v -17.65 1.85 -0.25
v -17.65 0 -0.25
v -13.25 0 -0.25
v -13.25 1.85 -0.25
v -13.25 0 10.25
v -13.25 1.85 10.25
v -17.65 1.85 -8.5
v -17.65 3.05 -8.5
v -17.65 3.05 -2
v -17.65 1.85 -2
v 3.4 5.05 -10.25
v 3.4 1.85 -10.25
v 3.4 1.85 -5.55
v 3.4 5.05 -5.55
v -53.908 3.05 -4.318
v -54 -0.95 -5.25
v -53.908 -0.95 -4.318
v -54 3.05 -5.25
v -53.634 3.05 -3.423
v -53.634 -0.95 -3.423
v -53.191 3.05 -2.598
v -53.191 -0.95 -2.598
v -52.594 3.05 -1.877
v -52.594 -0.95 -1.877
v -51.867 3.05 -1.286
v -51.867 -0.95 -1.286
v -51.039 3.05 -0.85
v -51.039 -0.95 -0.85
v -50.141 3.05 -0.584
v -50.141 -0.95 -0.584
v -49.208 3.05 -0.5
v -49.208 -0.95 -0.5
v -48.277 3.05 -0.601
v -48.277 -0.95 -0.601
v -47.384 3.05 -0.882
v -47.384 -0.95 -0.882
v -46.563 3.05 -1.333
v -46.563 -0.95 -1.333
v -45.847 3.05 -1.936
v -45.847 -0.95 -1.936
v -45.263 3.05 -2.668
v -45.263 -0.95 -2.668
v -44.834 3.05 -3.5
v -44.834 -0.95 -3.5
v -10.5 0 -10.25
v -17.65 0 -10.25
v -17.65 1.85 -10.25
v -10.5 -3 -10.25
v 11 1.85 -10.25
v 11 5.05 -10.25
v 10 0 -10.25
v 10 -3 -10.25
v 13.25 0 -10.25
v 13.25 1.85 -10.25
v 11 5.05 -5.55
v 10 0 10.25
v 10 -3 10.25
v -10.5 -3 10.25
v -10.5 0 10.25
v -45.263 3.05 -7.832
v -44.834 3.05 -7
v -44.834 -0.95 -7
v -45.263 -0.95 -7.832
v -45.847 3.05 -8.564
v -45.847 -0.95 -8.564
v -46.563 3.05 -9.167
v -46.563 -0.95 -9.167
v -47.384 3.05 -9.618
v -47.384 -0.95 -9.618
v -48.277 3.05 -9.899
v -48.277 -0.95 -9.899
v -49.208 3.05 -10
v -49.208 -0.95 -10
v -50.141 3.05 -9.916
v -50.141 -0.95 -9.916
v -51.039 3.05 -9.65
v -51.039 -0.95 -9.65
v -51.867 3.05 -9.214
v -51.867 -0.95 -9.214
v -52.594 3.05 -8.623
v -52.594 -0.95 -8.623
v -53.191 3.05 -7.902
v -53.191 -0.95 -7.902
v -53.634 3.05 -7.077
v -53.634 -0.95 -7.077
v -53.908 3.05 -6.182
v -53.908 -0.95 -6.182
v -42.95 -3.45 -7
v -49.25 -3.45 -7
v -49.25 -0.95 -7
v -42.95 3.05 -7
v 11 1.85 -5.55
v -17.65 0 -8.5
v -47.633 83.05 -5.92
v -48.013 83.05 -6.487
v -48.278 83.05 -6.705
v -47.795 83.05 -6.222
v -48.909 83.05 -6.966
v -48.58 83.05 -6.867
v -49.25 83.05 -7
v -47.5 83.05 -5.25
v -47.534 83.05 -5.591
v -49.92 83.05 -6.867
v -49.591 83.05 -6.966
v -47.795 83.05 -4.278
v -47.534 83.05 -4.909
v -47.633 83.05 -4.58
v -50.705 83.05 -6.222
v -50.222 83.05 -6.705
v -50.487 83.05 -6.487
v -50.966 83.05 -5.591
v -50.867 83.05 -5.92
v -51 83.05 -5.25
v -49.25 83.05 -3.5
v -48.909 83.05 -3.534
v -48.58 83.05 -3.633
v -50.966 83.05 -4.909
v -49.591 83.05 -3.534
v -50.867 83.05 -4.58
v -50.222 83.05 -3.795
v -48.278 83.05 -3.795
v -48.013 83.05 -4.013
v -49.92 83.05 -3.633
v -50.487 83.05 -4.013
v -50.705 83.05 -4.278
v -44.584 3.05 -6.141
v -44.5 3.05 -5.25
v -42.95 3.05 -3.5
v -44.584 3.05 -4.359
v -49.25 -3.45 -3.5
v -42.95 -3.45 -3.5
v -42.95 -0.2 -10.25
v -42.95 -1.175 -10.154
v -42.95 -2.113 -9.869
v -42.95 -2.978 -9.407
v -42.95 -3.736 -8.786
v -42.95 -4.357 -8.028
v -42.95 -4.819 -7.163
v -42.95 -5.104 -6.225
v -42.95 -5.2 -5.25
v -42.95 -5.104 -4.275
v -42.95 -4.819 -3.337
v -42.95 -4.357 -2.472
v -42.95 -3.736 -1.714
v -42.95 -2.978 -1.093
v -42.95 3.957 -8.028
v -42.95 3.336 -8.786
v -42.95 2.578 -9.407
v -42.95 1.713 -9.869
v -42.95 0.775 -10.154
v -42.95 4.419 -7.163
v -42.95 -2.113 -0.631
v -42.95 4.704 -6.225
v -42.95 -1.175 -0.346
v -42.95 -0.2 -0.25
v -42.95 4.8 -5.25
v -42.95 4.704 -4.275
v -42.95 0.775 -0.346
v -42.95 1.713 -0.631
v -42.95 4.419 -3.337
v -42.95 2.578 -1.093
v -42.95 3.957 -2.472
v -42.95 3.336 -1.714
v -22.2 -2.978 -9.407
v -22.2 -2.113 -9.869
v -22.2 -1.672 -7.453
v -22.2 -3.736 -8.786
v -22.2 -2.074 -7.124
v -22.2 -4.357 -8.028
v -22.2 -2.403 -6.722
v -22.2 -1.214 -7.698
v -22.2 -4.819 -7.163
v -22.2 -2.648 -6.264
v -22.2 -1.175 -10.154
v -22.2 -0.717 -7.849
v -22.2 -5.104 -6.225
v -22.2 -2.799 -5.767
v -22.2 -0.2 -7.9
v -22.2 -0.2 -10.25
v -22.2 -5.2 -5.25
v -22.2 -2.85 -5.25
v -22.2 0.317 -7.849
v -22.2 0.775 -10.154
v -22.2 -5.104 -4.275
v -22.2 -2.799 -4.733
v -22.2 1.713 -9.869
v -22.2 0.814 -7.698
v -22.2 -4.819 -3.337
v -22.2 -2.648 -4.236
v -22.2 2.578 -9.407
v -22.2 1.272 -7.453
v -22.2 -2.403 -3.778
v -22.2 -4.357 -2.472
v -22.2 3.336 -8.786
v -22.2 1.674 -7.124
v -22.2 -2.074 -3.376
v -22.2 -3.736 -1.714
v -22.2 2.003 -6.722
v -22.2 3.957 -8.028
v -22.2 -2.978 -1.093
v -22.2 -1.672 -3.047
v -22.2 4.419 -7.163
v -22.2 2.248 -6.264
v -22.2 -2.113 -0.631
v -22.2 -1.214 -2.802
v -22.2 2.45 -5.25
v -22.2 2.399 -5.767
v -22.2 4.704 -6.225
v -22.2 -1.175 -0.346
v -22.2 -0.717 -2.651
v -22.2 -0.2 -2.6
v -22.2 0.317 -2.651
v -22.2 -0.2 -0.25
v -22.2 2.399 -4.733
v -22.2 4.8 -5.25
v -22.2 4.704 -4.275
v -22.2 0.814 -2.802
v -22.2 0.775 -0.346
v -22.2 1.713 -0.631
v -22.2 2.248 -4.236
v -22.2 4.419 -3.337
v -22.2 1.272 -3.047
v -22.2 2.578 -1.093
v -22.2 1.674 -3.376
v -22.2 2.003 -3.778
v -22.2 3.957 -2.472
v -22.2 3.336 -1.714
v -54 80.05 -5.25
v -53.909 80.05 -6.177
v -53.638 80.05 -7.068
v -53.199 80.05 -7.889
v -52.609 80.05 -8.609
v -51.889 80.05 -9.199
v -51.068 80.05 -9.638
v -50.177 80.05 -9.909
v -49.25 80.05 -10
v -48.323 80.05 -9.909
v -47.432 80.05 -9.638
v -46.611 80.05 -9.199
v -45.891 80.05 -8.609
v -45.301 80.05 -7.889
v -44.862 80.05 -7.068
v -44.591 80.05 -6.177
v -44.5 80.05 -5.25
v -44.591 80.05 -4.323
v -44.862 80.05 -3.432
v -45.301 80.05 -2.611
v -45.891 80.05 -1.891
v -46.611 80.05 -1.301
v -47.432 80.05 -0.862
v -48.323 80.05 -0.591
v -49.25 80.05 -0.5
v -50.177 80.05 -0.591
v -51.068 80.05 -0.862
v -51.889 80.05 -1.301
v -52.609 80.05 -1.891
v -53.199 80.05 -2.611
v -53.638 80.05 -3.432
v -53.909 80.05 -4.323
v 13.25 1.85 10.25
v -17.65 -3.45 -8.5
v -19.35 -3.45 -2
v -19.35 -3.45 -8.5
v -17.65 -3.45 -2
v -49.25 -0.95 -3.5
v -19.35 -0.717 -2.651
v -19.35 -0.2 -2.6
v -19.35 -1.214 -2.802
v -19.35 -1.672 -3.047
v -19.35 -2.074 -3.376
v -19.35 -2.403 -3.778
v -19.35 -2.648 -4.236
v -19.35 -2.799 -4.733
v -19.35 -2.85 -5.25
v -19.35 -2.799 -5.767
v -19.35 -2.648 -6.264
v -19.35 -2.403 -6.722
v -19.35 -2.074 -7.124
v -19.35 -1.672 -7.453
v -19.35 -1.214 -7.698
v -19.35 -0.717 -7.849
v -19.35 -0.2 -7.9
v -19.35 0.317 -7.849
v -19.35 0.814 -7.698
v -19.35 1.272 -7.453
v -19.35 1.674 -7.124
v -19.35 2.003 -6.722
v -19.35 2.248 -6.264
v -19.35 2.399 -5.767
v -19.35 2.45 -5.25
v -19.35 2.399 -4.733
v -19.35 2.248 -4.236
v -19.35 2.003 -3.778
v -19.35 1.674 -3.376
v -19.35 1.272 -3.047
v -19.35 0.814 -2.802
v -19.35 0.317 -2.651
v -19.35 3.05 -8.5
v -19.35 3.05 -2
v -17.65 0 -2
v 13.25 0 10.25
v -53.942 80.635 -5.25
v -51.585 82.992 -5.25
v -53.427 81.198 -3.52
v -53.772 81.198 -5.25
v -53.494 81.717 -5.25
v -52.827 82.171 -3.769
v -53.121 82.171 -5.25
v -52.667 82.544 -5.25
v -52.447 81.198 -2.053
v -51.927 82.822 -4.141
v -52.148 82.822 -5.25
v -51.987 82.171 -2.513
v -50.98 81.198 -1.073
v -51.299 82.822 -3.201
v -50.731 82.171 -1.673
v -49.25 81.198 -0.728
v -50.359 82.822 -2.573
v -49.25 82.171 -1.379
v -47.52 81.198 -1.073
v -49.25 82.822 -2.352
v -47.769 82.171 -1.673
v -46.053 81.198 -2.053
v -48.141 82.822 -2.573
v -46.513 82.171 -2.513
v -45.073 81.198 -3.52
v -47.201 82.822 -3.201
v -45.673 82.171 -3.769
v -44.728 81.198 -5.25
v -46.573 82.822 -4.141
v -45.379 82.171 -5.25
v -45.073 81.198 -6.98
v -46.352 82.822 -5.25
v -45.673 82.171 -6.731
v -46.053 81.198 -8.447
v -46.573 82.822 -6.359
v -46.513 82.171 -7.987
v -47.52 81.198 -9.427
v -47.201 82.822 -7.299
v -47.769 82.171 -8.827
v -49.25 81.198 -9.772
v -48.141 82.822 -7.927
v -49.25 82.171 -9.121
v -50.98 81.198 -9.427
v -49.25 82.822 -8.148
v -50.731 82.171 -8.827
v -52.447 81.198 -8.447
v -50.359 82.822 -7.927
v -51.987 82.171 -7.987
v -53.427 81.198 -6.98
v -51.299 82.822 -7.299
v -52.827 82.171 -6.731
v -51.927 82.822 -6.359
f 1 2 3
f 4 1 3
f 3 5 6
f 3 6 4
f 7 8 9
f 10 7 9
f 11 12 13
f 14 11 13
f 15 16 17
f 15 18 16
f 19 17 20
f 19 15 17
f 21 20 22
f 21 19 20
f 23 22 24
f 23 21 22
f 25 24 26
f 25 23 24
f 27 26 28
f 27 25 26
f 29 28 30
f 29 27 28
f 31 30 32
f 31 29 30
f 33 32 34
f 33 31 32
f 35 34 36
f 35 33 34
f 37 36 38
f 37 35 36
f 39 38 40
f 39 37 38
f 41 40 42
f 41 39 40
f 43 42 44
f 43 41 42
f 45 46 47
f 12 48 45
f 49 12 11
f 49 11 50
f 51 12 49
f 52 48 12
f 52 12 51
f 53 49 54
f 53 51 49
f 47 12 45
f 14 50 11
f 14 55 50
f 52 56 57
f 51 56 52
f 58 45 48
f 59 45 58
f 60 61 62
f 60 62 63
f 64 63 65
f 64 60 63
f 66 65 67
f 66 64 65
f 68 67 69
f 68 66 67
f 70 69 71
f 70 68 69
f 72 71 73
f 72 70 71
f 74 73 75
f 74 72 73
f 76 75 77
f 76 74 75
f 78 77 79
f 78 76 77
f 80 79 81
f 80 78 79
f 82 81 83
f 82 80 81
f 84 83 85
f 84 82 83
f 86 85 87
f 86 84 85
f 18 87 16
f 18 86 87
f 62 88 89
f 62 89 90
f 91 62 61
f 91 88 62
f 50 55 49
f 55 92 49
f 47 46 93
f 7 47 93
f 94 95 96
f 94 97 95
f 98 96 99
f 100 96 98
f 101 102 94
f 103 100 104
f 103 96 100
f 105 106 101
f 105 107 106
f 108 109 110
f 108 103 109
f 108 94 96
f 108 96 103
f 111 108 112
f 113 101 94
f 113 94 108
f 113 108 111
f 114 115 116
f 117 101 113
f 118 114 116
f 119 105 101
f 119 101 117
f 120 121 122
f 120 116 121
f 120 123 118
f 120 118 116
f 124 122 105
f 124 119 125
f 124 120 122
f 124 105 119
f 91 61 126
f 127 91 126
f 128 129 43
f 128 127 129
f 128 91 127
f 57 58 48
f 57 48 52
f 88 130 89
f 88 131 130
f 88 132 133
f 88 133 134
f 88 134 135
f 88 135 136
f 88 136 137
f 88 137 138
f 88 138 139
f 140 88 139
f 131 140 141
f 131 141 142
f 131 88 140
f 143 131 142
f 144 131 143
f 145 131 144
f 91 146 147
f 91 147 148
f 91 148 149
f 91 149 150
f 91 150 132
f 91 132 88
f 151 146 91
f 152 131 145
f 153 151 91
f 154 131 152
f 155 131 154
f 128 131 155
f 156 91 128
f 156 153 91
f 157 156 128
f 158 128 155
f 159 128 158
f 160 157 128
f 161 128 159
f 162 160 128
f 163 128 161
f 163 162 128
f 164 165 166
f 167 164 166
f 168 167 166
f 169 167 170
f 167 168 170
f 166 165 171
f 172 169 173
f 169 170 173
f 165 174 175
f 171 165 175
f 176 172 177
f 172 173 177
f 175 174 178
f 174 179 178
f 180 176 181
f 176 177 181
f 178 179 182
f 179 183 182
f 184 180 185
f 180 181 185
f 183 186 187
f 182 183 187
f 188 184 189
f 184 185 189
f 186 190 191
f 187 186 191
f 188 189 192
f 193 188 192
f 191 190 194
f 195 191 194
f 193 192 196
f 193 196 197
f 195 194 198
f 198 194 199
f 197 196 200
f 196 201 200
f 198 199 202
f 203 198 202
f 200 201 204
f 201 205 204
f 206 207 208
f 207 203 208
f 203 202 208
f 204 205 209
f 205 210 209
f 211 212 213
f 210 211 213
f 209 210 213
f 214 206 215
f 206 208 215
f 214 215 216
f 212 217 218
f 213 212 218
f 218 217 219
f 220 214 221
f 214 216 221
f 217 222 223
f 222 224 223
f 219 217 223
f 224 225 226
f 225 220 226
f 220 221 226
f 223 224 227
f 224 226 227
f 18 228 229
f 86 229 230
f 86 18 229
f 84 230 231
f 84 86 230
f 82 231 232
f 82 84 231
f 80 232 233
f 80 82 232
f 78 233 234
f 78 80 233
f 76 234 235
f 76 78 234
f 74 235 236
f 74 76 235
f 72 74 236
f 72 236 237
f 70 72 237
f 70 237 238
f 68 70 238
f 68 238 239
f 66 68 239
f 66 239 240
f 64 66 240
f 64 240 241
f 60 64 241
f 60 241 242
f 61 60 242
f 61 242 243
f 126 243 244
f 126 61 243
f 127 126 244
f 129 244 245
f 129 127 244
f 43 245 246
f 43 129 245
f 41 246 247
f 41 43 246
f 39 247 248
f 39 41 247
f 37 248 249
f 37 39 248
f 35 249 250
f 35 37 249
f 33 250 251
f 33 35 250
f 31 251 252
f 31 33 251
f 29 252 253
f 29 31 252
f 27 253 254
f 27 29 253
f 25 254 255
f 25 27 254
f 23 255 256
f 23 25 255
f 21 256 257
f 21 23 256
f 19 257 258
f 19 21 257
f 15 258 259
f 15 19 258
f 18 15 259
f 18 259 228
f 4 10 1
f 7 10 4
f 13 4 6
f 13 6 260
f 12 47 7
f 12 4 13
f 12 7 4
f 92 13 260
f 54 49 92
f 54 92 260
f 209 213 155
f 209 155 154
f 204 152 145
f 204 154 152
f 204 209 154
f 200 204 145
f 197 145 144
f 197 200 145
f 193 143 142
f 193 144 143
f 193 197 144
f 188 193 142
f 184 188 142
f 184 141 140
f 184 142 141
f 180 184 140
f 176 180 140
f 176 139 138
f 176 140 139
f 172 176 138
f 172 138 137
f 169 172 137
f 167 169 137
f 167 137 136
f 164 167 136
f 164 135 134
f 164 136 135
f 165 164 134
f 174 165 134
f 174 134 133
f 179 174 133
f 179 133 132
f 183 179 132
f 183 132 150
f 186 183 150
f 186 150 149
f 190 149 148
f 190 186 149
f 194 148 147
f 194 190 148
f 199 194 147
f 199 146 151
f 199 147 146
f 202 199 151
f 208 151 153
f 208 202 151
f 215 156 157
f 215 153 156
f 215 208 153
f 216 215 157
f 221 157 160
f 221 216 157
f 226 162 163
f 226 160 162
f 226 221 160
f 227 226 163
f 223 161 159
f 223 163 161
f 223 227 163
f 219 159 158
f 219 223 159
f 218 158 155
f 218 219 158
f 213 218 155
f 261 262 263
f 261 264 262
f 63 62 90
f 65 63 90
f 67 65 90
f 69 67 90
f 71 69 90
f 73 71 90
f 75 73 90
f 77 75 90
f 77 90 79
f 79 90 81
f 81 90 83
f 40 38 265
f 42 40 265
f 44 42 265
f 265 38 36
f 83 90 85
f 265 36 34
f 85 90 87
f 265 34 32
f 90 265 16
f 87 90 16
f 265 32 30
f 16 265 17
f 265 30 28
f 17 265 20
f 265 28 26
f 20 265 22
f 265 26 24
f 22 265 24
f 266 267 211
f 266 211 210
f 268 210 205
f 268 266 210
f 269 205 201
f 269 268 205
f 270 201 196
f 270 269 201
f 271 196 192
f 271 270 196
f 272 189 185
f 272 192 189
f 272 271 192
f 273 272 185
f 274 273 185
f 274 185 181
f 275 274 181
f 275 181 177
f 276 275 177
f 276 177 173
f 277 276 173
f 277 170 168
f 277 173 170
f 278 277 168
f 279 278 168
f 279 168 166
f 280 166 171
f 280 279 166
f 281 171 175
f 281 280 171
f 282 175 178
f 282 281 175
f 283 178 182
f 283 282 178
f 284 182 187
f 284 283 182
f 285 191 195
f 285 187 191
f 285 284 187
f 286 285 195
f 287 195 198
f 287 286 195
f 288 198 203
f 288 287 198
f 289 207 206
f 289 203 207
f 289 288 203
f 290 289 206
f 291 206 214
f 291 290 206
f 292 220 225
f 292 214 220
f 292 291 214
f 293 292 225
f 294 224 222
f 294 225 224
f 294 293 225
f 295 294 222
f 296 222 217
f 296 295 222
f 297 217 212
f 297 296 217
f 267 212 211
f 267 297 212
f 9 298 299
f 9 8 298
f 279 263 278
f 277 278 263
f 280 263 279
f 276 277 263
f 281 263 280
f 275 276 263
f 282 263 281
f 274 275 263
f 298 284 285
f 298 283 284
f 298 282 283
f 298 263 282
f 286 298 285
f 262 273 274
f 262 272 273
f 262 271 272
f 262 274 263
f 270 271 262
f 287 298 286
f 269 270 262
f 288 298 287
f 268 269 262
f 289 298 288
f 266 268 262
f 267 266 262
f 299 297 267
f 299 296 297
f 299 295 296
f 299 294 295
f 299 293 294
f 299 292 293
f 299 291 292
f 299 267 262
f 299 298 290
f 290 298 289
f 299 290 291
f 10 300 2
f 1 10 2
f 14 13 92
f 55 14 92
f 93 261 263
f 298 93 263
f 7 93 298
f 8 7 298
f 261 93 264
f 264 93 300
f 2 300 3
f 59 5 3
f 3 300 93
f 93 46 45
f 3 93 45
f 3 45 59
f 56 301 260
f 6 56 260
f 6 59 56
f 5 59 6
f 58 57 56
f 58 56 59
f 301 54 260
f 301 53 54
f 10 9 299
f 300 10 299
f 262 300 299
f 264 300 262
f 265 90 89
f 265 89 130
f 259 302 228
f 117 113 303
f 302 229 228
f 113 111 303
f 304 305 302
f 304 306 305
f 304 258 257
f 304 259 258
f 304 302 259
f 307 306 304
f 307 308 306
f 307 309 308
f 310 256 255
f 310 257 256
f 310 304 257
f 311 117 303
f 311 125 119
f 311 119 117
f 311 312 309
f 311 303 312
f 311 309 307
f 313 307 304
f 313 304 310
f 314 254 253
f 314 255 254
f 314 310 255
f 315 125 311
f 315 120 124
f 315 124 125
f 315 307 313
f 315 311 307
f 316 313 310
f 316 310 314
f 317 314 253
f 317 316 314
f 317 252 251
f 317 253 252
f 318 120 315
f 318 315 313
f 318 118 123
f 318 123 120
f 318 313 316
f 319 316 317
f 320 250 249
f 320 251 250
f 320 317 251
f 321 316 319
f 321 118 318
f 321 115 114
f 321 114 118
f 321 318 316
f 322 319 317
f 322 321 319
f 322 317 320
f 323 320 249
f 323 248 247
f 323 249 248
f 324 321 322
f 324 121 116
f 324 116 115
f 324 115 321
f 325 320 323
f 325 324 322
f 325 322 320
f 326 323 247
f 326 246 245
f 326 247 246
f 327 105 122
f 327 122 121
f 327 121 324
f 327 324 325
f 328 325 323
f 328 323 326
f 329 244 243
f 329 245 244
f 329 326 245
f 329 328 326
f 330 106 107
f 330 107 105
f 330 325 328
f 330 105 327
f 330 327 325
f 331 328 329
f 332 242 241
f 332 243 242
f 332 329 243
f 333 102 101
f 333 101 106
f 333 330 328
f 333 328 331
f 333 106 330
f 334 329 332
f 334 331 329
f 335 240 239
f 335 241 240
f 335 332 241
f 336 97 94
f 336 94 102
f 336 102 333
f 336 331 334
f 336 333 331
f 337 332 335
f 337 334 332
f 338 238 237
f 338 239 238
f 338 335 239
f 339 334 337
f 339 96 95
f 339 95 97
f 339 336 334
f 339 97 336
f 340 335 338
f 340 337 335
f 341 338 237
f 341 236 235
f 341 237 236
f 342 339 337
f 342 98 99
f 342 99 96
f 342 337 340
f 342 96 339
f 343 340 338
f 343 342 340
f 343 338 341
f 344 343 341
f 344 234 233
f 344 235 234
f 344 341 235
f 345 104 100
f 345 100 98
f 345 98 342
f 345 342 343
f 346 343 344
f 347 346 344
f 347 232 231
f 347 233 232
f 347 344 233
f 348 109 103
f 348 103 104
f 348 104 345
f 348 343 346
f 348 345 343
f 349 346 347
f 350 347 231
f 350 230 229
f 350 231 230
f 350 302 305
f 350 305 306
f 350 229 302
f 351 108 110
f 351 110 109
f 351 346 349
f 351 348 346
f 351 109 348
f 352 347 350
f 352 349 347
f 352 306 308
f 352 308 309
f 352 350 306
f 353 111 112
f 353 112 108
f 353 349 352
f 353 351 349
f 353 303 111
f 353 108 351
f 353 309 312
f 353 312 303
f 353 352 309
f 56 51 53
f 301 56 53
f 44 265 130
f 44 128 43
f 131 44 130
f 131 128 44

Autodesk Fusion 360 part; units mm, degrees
sketch "Sketch1" plane through (0, 0, 0) normal (0, 1, 0) x (1, 0, 0)
  line L0 (13.25, -10.25) -> (-13.25, -10.25)
  line L1 (-13.25, -10.25) -> (-13.25, 10.25)
  line L2 (-13.25, 10.25) -> (13.25, 10.25)
  line L3 (13.25, 10.25) -> (13.25, -10.25)
  line L4 (13.25, -10.25) -> (-13.25, 10.25) construction
  line L5 (-13.25, -10.25) -> (13.25, 10.25) construction
  line L6 (-13.25, 10.25) -> (-17.65, 10.25)
  line L7 (-17.65, 10.25) -> (-17.65, 0.25)
  line L8 (-17.65, 0.25) -> (-13.25, 0.25)
  dimension "d1" = 26.5
  dimension "d2" = 20.5
  dimension "d3" = 10
  dimension "d4" = 4.4
extrude "Extrude1" add sketch "Sketch1" along normal blind 1.85
sketch "Sketch2" plane through (0, 1.85, 0) normal (0, 1, 0) x (-1, 0, 0)
  line L0 (-13.25, -10.25) -> (17.65, -10.25)
  line L1 (17.65, -10.25) -> (17.65, -0.25)
  line L2 (17.65, -0.25) -> (13.25, -0.25)
  line L3 (13.25, -0.25) -> (13.25, 10.25)
  line L4 (13.25, 10.25) -> (-13.25, 10.25)
  line L5 (-13.25, 10.25) -> (-13.25, -10.25)
  line L6 (-11, -10.25) -> (-3.4, -10.25)
  line L7 (-3.4, -10.25) -> (-3.4, -5.55)
  line L8 (-3.4, -5.55) -> (-11, -5.55)
  line L9 (-11, -5.55) -> (-11, -10.25)
  dimension "d7" = 7.6
  dimension "d8" = 4.7
  dimension "d9" = 2.25
extrude "Extrude2" add sketch "Sketch2" along normal blind 3.2 contours L0 L6 L7 L8 L9
sketch "Sketch3" plane through (0, 0, 0) normal (0, -1, 0) x (1, 0, 0)
  line L0 (-17.65, -10.25) -> (13.25, -10.25)
  line L1 (13.25, -10.25) -> (13.25, 10.25)
  line L2 (13.25, 10.25) -> (-13.25, 10.25)
  line L3 (-13.25, 10.25) -> (-13.25, -0.25)
  line L4 (-13.25, -0.25) -> (-17.65, -0.25)
  line L5 (-17.65, -0.25) -> (-17.65, -10.25)
  line L6 (-10.5, 10.25) -> (10, 10.25)
  line L7 (10, 10.25) -> (10, -10.25)
  line L8 (10, -10.25) -> (-10.5, -10.25)
  line L9 (-10.5, -10.25) -> (-10.5, 10.25)
  dimension "d12" = 20.5
  dimension "d13" = 3.25
extrude "Extrude3" add sketch "Sketch3" along normal blind 3 contours L0 L2 L6 L7 L8 L9
sketch "Sketch4" plane through (-17.65, 0, 0) normal (-1, 0, 0) x (0, 0, 1)
  line L0 (-10.25, 0) -> (-0.25, 0)
  line L1 (-0.25, 0) -> (-0.25, 1.85)
  line L2 (-0.25, 1.85) -> (-10.25, 1.85)
  line L3 (-10.25, 1.85) -> (-10.25, 0)
  line L4 (-8.5, 3.05) -> (-2, 3.05)
  line L5 (-2, 3.05) -> (-2, -3.45)
  line L6 (-2, -3.45) -> (-8.5, -3.45)
  line L7 (-8.5, -3.45) -> (-8.5, 3.05)
  dimension "d16" = 6.5
  dimension "d17" = 6.5
  dimension "d18" = 1.2
  dimension "d19" = 1.75
extrude "Extrude4" add sketch "Sketch4" along normal blind 1.7 contours L0 L2 L5 L7 | L0 L5 L6 L7 | L2 L4 L5 L7
sketch "Sketch5" plane through (-19.35, 0, 0) normal (-1, 0, 0) x (0, 0, 1)
  line L0 (-8.5, -3.45) -> (-2, -3.45)
  line L1 (-2, -3.45) -> (-2, 3.05)
  line L2 (-2, 3.05) -> (-8.5, 3.05)
  line L3 (-8.5, 3.05) -> (-8.5, -3.45)
  circle A0 centre (-5.25, -0.2) radius 2.65
  line L4 (-5.25, -0.2) -> (-5.25, 3.05) construction
  line L5 (-5.25, -0.2) -> (-5.25, -3.45) construction
  dimension "d22" = 5.3
extrude "Extrude5" add sketch "Sketch5" along normal blind 2.85 contours A0
sketch "Sketch6" plane through (-22.2, 0, 0) normal (-1, 0, 0) x (0, 0, 1)
  circle A0 centre (-5.25, -0.2) radius 2.65
  circle A1 centre (-5.25, -0.2) radius 5
  dimension "d25" = 10
extrude "Extrude6" add sketch "Sketch6" along normal blind 20.75 contours A0 | A1
sketch "Sketch7" plane through (-42.95, 0, 0) normal (-1, 0, 0) x (0, 0, 1)
  circle A0 centre (-5.25, -0.2) radius 5
  line L0 (-3.5, -3.45) -> (-7, -3.45)
  line L1 (-7, -3.45) -> (-7, 3.05)
  line L2 (-7, 3.05) -> (-3.5, 3.05)
  line L3 (-3.5, 3.05) -> (-3.5, -3.45)
  line L4 (-3.5, -3.45) -> (-7, 3.05) construction
  line L5 (-7, -3.45) -> (-3.5, 3.05) construction
  point P0 (-5.25, -0.2)
  dimension "d28" = 6.5
  dimension "d29" = 3.5
extrude "Extrude7" add sketch "Sketch7" along normal blind 6.3 contours L0 L1 L2 L3
sketch "Sketch8" plane through (0, 3.05, 0) normal (0, 1, 0) x (-1, 0, 0)
  line L0 (42.95, -3.5) -> (42.95, -7)
  line L1 (42.95, -7) -> (49.25, -7)
  line L2 (49.25, -7) -> (49.25, -3.5)
  line L3 (49.25, -3.5) -> (42.95, -3.5)
  circle A0 centre (49.25, -5.25) radius 4.75
  dimension "d32" = 9.5
extrude "Extrude8" add sketch "Sketch8" along normal blind 80 contours L1 L2 L3 A0 | L1 L2 L3 A0
extrude "Extrude9" add 1 faces at (-50.8333, 3.05, -5.25) along direction (0, -1, 0) blind 4
fillet "Fillet1" radius 3 1 edges at (-44.8214, 83.05, -6.9677)
